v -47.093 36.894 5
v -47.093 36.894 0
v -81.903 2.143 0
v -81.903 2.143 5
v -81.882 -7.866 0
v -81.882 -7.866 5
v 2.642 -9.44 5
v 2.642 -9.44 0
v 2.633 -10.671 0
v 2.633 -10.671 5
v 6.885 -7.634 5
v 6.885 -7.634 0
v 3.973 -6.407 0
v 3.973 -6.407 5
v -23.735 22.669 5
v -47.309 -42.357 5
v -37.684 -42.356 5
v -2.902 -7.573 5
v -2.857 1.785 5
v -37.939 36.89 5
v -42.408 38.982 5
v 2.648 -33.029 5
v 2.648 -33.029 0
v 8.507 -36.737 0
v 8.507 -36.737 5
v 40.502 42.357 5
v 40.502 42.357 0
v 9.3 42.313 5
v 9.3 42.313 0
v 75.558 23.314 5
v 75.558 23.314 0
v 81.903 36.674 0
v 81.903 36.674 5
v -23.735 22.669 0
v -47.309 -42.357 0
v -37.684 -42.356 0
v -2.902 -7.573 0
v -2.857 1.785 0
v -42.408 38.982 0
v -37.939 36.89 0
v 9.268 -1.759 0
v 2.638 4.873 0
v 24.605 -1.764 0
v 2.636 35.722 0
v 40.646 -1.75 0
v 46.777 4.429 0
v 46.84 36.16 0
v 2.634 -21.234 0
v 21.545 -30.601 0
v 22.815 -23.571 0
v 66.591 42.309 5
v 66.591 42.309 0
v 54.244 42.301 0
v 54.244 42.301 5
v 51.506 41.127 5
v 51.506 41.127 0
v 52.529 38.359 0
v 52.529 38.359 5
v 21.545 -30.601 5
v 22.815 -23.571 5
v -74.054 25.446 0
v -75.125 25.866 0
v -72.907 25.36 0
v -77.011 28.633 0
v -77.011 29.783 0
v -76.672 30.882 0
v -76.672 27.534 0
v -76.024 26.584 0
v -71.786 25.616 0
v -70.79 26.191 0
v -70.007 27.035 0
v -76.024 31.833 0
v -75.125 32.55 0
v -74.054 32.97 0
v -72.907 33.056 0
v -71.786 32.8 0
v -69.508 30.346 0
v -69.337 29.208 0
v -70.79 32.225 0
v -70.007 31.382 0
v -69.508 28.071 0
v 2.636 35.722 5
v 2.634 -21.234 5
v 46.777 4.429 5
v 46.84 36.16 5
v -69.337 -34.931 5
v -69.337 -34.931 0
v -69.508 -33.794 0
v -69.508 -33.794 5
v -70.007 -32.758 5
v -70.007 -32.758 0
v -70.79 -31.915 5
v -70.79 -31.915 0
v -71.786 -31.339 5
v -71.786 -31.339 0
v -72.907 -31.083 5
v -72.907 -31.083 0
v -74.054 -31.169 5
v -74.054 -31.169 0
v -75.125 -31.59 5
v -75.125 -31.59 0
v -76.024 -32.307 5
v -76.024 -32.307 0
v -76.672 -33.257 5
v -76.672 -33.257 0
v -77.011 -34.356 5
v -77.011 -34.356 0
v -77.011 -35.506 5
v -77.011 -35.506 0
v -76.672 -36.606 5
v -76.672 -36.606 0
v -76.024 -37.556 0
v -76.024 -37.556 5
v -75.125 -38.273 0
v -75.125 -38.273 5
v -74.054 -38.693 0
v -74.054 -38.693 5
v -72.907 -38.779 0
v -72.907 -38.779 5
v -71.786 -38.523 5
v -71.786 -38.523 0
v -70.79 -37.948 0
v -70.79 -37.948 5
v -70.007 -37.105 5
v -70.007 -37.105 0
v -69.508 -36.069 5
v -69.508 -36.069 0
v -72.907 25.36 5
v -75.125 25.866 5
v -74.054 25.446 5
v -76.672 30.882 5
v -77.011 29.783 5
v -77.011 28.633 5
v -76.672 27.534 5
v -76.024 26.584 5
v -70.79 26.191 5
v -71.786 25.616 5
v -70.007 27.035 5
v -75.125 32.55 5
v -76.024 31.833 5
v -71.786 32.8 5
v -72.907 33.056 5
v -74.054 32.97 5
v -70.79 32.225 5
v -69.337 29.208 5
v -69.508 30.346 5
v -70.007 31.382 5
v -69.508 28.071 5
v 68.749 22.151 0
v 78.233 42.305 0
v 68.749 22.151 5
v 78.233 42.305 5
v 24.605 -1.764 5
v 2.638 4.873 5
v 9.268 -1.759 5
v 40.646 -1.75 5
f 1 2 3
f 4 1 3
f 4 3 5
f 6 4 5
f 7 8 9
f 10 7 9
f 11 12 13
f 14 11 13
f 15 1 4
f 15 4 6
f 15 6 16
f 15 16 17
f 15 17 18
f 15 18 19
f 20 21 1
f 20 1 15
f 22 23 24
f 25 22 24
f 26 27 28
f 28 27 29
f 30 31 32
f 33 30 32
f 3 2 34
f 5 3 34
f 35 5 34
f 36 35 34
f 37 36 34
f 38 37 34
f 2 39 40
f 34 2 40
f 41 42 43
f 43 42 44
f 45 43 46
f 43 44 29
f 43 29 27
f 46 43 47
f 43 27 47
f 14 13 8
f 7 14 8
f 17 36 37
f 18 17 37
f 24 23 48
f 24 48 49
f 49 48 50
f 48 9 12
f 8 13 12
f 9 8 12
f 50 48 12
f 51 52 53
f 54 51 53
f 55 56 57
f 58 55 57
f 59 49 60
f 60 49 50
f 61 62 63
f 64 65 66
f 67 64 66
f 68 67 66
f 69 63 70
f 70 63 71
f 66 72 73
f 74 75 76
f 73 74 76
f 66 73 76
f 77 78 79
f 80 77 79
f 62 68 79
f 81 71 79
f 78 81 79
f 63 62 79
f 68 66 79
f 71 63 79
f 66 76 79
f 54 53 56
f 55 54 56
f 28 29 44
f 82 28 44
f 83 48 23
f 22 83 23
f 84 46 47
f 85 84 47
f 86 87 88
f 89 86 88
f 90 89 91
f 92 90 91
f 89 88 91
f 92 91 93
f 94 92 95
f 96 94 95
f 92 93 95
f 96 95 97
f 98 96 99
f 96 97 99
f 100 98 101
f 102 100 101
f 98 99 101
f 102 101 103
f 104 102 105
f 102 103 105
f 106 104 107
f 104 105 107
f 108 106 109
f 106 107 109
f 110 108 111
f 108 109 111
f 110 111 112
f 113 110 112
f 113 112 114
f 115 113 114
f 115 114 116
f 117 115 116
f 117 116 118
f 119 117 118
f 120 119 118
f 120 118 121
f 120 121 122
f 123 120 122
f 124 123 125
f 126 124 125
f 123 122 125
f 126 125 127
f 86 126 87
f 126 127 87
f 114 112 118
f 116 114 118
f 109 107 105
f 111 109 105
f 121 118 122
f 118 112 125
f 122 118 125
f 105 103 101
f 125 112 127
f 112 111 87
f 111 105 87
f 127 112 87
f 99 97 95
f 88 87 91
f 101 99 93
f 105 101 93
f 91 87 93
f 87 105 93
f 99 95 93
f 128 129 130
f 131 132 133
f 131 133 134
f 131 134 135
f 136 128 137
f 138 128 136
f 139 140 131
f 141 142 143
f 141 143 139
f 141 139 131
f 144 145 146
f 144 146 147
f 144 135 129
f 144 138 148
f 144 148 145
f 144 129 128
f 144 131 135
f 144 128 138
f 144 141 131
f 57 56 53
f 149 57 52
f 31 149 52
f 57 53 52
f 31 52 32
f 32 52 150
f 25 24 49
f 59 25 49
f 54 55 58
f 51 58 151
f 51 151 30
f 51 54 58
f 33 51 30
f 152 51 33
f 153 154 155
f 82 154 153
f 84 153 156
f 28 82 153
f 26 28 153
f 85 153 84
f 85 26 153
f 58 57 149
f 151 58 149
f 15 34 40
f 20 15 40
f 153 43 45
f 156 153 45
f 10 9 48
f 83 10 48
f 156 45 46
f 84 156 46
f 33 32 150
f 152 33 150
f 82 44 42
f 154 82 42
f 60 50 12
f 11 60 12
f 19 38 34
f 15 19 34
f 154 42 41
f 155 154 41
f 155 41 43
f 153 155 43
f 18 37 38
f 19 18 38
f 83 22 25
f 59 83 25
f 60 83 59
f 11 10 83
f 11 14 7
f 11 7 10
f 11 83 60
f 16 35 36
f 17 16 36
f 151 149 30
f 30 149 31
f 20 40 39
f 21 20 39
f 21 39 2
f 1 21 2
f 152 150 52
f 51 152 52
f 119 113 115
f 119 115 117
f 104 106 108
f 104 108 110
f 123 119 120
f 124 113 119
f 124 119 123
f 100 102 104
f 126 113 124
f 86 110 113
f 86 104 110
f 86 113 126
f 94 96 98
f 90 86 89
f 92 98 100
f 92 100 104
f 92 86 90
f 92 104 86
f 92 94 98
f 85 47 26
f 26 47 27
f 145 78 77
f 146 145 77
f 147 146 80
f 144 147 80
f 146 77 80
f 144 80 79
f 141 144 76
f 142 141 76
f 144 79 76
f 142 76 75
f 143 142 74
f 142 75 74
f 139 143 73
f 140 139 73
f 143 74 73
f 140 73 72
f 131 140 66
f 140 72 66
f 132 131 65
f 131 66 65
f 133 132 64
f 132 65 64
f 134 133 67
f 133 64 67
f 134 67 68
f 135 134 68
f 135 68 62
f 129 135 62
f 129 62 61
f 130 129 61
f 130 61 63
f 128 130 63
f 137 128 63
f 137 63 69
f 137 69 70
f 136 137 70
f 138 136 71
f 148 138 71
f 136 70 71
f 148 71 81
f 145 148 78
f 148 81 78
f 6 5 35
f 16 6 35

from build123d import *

# Parameters (mm, degrees)
F0_R     = 3.858673
F1_DEPTH = 5


with BuildPart() as f1:
    # F0 (on Top) → F1 (new body)
    with BuildSketch(Plane.XY):
        Polygon((-37.938597, 36.889652), (-42.407919, 38.982203), (-47.093249, 36.893786), (-81.903183, 2.143108), (-81.881823, -7.866272), (-47.309257, -42.356673), (-37.68366, -42.355984), (-2.901631, -7.573439), (-2.856501, 1.784818), (-23.735157, 22.668987), align=None)
        Polygon((9.268169, -1.759496), (24.6047, -1.76363), (40.646443, -1.74985), (46.777335, 4.429274), (46.839691, 36.159637), (40.502093, 42.356674), (9.300208, 42.312922), (2.63636, 35.722454), (2.638427, 4.872657), align=None)
        Polygon((2.632915, -10.671269), (2.633604, -21.233932), (2.648418, -33.028561), (8.507147, -36.736517), (21.544766, -30.601146), (22.814973, -23.57074), (6.885196, -7.634073), (3.973401, -6.40693), (2.641872, -9.439647), align=None)
        Polygon((78.232779, 42.304653), (66.591112, 42.309476), (54.244235, 42.300519), (51.505728, 41.12712), (52.528577, 38.358641), (68.748776, 22.150845), (75.558007, 23.314254), (81.903184, 36.673989), align=None)
        with Locations((-73.195359, 29.208195)):
            Circle(F0_R)
        with Locations((-73.195359, -34.931359)):
            Circle(F0_R)
    extrude(amount=F1_DEPTH)


solid = f1.part
